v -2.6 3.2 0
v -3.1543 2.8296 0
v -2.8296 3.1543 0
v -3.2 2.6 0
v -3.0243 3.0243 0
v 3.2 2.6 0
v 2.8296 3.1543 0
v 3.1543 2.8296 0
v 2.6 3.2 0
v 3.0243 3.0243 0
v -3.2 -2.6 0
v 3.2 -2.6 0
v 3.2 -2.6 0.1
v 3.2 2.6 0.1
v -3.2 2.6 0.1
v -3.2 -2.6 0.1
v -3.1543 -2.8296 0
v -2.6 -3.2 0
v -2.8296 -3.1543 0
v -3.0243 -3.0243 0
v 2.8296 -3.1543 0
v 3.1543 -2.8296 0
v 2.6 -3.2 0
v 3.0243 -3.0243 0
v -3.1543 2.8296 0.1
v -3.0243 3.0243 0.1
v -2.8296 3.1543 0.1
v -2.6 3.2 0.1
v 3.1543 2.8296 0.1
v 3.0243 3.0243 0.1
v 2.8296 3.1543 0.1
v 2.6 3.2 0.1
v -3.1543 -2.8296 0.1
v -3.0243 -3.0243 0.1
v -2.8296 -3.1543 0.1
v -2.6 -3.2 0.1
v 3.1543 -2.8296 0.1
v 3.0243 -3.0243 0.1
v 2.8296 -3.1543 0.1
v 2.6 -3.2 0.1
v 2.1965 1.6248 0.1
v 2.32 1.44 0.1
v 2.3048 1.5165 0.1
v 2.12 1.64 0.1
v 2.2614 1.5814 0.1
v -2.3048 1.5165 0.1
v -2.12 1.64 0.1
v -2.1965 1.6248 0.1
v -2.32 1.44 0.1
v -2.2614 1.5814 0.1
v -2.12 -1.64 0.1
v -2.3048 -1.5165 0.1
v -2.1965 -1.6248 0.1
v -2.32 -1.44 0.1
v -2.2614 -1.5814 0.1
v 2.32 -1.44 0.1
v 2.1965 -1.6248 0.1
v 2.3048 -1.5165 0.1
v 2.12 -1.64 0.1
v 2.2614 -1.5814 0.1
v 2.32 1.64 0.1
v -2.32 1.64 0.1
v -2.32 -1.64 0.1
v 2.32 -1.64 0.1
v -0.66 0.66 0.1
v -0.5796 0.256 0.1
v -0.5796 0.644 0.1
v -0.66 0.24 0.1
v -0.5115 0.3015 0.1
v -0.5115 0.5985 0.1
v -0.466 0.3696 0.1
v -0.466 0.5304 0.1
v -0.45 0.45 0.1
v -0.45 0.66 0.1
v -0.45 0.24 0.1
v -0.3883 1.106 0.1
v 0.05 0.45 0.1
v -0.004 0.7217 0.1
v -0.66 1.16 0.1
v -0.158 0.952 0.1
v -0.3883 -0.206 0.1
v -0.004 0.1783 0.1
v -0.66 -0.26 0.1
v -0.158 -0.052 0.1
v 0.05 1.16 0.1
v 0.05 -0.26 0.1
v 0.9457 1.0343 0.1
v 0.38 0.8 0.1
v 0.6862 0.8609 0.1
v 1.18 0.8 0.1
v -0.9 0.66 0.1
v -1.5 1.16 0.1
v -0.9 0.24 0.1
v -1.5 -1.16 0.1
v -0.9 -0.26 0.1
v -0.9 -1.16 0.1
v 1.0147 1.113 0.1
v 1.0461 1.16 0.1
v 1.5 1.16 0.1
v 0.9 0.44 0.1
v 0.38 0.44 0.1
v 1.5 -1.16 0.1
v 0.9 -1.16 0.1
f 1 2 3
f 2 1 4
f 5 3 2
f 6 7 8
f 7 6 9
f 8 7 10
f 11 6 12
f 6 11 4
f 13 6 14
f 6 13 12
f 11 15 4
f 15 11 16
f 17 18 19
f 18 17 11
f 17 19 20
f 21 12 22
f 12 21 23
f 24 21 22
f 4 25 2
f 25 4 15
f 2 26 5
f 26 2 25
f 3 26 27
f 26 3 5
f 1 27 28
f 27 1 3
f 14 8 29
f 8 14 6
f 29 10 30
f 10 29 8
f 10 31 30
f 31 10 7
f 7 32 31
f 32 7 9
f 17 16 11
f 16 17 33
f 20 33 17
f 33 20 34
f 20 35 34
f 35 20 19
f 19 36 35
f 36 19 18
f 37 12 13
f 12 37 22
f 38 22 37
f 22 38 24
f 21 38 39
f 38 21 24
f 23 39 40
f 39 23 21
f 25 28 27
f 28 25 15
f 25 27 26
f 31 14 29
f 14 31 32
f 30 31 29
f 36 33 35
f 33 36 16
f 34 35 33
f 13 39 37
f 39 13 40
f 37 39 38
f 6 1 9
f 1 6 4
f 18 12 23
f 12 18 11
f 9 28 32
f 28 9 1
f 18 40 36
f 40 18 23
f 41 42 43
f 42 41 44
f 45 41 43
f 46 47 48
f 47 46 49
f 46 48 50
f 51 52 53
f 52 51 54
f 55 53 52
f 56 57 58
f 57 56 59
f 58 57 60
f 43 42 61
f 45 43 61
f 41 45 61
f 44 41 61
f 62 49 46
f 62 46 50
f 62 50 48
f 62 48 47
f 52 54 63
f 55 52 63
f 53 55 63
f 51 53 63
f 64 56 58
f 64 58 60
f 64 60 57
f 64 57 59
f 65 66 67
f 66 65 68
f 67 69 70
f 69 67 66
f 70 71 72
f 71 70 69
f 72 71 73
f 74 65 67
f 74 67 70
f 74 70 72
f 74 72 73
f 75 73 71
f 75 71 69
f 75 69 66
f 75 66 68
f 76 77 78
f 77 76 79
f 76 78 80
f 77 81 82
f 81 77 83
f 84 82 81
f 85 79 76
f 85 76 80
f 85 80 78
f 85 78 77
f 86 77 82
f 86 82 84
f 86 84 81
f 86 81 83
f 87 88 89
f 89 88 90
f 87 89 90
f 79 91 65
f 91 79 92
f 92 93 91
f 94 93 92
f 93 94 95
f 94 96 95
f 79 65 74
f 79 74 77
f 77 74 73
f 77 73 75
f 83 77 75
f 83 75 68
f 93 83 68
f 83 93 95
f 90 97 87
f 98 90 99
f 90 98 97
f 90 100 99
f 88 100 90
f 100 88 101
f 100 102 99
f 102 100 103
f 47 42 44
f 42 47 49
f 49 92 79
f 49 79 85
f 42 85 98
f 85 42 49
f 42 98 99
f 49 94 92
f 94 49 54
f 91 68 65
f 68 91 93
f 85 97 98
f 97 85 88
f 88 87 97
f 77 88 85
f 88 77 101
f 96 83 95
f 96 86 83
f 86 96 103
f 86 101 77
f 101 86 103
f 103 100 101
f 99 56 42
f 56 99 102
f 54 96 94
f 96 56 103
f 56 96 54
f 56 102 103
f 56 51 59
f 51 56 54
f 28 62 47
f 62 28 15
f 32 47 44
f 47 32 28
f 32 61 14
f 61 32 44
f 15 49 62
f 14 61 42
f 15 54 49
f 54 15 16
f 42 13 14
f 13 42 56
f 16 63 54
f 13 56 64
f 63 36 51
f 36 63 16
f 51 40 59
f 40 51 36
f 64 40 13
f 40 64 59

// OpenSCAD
use <../lib.scad>
use <../p/1-4chrd.scad>
use <../p/1-4cyli.scad>
use <../p/1-4ndis.scad>
use <../p/1-8chrd.scad>
use <../p/1-8ndis.scad>
use <../p/2-4chrd.scad>
use <../p/2-4ndis.scad>
use <../p/box3u12.scad>
$fa=1; $fs=0.2;
function ldraw_lib__6142275s(realsolid=false) = [
// 0 Sticker  0.8 x  0.8 with Red "P1" in White Square on Red Background
// 0 Name: 6142275s.dat
// 0 Author: Massimo Maso [Sirio]
// 0 !LDRAW_ORG Part UPDATE 2022-06
// 0 !LICENSE Licensed under CC BY 2.0 and CC BY 4.0 : see CAreadme.txt
// 
// 0 BFC CERTIFY CCW
  [0,"BFC","CERTIFY"],
  [0,"BFC","CCW"],
// 
// 0 !KEYWORDS Audi, e-tron, quattro, R18, Set 75872, Speed Champions
// 
// 0 !HISTORY 2022-12-20 [PTadmin] Official Update 2022-06
// 
// 
// 0 // Primitives
// 1 16 -6.5 0 6.5 -1.5 0 0 0 -1 0 0 0 1.5 1-4chrd.dat
  [1,16,-6.5,0,6.5,-1.5,0,0,0,-1,0,0,0,1.5, ldraw_lib__1_4chrd(realsolid)],
// 1 16 6.5 0 6.5 1.5 0 0 0 -1 0 0 0 1.5 1-4chrd.dat
  [1,16,6.5,0,6.5,1.5,0,0,0,-1,0,0,0,1.5, ldraw_lib__1_4chrd(realsolid)],
// 1 16 0 -.25 0 0 0 8 0 .25 0 -6.5 0 0 box3u12.dat
  [1,16,0,-.25,0,0,0,8,0,.25,0,-6.5,0,0, ldraw_lib__box3u12(realsolid)],
// 1 16 -6.5 0 -6.5 -1.5 0 0 0 -1 0 0 0 -1.5 1-4chrd.dat
  [1,16,-6.5,0,-6.5,-1.5,0,0,0,-1,0,0,0,-1.5, ldraw_lib__1_4chrd(realsolid)],
// 1 16 6.5 0 -6.5 1.5 0 0 0 -1 0 0 0 -1.5 1-4chrd.dat
  [1,16,6.5,0,-6.5,1.5,0,0,0,-1,0,0,0,-1.5, ldraw_lib__1_4chrd(realsolid)],
// 1 16 -6.5 0 6.5 -1.5 0 0 0 -.25 0 0 0 1.5 1-4cyli.dat
  [1,16,-6.5,0,6.5,-1.5,0,0,0,-.25,0,0,0,1.5, ldraw_lib__1_4cyli(realsolid)],
// 1 16 6.5 0 6.5 1.5 0 0 0 -.25 0 0 0 1.5 1-4cyli.dat
  [1,16,6.5,0,6.5,1.5,0,0,0,-.25,0,0,0,1.5, ldraw_lib__1_4cyli(realsolid)],
// 1 16 -6.5 0 -6.5 -1.5 0 0 0 -.25 0 0 0 -1.5 1-4cyli.dat
  [1,16,-6.5,0,-6.5,-1.5,0,0,0,-.25,0,0,0,-1.5, ldraw_lib__1_4cyli(realsolid)],
// 1 16 6.5 0 -6.5 1.5 0 0 0 -.25 0 0 0 -1.5 1-4cyli.dat
  [1,16,6.5,0,-6.5,1.5,0,0,0,-.25,0,0,0,-1.5, ldraw_lib__1_4cyli(realsolid)],
// 1 4 -6.5 -.25 6.5 -1.5 0 0 0 1 0 0 0 1.5 1-4chrd.dat
  [1,4,-6.5,-.25,6.5,-1.5,0,0,0,1,0,0,0,1.5, ldraw_lib__1_4chrd(realsolid)],
// 1 4 6.5 -.25 6.5 1.5 0 0 0 1 0 0 0 1.5 1-4chrd.dat
  [1,4,6.5,-.25,6.5,1.5,0,0,0,1,0,0,0,1.5, ldraw_lib__1_4chrd(realsolid)],
// 1 4 -6.5 -.25 -6.5 -1.5 0 0 0 1 0 0 0 -1.5 1-4chrd.dat
  [1,4,-6.5,-.25,-6.5,-1.5,0,0,0,1,0,0,0,-1.5, ldraw_lib__1_4chrd(realsolid)],
// 1 4 6.5 -.25 -6.5 1.5 0 0 0 1 0 0 0 -1.5 1-4chrd.dat
  [1,4,6.5,-.25,-6.5,1.5,0,0,0,1,0,0,0,-1.5, ldraw_lib__1_4chrd(realsolid)],
// 0 // Bottom faces
// 4 16 6.5 0 8 8 0 6.5 -8 0 6.5 -6.5 0 8
  [4,16,6.5,0,8,8,0,6.5,-8,0,6.5,-6.5,0,8],
// 4 16 6.5 0 -8 -6.5 0 -8 -8 0 -6.5 8 0 -6.5
  [4,16,6.5,0,-8,-6.5,0,-8,-8,0,-6.5,8,0,-6.5],
// 0 // Lateral faces
// 4 16 -6.5 0 8 -6.5 -.25 8 6.5 -.25 8 6.5 0 8
  [4,16,-6.5,0,8,-6.5,-.25,8,6.5,-.25,8,6.5,0,8],
// 4 16 -6.5 0 -8 6.5 0 -8 6.5 -.25 -8 -6.5 -.25 -8
  [4,16,-6.5,0,-8,6.5,0,-8,6.5,-.25,-8,-6.5,-.25,-8],
// 0 // Top faces
// 0 // Primitives
// 1 15 5.3 -.25 3.6 .5 0 0 0 1 0 0 0 .5 1-4chrd.dat
  [1,15,5.3,-.25,3.6,.5,0,0,0,1,0,0,0,.5, ldraw_lib__1_4chrd(realsolid)],
// 1 15 -5.3 -.25 3.6 -.5 0 0 0 1 0 0 0 .5 1-4chrd.dat
  [1,15,-5.3,-.25,3.6,-.5,0,0,0,1,0,0,0,.5, ldraw_lib__1_4chrd(realsolid)],
// 1 15 -5.3 -.25 -3.6 -.5 0 0 0 1 0 0 0 -.5 1-4chrd.dat
  [1,15,-5.3,-.25,-3.6,-.5,0,0,0,1,0,0,0,-.5, ldraw_lib__1_4chrd(realsolid)],
// 1 15 5.3 -.25 -3.6 .5 0 0 0 1 0 0 0 -.5 1-4chrd.dat
  [1,15,5.3,-.25,-3.6,.5,0,0,0,1,0,0,0,-.5, ldraw_lib__1_4chrd(realsolid)],
// 1 4 5.3 -.25 3.6 .5 0 0 0 1 0 0 0 .5 1-4ndis.dat
  [1,4,5.3,-.25,3.6,.5,0,0,0,1,0,0,0,.5, ldraw_lib__1_4ndis(realsolid)],
// 1 4 -5.3 -.25 3.6 -.5 0 0 0 1 0 0 0 .5 1-4ndis.dat
  [1,4,-5.3,-.25,3.6,-.5,0,0,0,1,0,0,0,.5, ldraw_lib__1_4ndis(realsolid)],
// 1 4 -5.3 -.25 -3.6 -.5 0 0 0 1 0 0 0 -.5 1-4ndis.dat
  [1,4,-5.3,-.25,-3.6,-.5,0,0,0,1,0,0,0,-.5, ldraw_lib__1_4ndis(realsolid)],
// 1 4 5.3 -.25 -3.6 .5 0 0 0 1 0 0 0 -.5 1-4ndis.dat
  [1,4,5.3,-.25,-3.6,.5,0,0,0,1,0,0,0,-.5, ldraw_lib__1_4ndis(realsolid)],
// 1 15 -1.65 -.25 1.125 0 0 .525 0 1 0 .525 0 0 2-4chrd.dat
  [1,15,-1.65,-.25,1.125,0,0,.525,0,1,0,.525,0,0, ldraw_lib__2_4chrd(realsolid)],
// 1 4 -1.65 -.25 1.125 0 0 .525 0 1 0 .525 0 0 2-4ndis.dat
  [1,4,-1.65,-.25,1.125,0,0,.525,0,1,0,.525,0,0, ldraw_lib__2_4ndis(realsolid)],
// 1 4 -1.65 -.25 1.125 0 0 1.775 0 1 0 1.775 0 0 1-4chrd.dat
  [1,4,-1.65,-.25,1.125,0,0,1.775,0,1,0,1.775,0,0, ldraw_lib__1_4chrd(realsolid)],
// 1 4 -1.65 -.25 1.125 0 0 1.775 0 1 0 -1.775 0 0 1-4chrd.dat
  [1,4,-1.65,-.25,1.125,0,0,1.775,0,1,0,-1.775,0,0, ldraw_lib__1_4chrd(realsolid)],
// 1 15 -1.65 -.25 1.125 0 0 1.775 0 1 0 1.775 0 0 2-4ndis.dat
  [1,15,-1.65,-.25,1.125,0,0,1.775,0,1,0,1.775,0,0, ldraw_lib__2_4ndis(realsolid)],
// 1 15 .95 -.25 4 0 0 2 0 1 0 -2 0 0 1-8chrd.dat
  [1,15,.95,-.25,4,0,0,2,0,1,0,-2,0,0, ldraw_lib__1_8chrd(realsolid)],
// 1 4 .95 -.25 4 0 0 2 0 1 0 -2 0 0 1-8ndis.dat
  [1,4,.95,-.25,4,0,0,2,0,1,0,-2,0,0, ldraw_lib__1_8ndis(realsolid)],
// 0 // Red text "P1"
// 0 // Letter "P"
// 4 4 -3.75 -.25 2.9 -2.25 -.25 1.65 -1.65 -.25 1.65 -1.65 -.25 2.9
  [4,4,-3.75,-.25,2.9,-2.25,-.25,1.65,-1.65,-.25,1.65,-1.65,-.25,2.9],
// 3 4 -3.75 -.25 2.9 -2.25 -.25 .6 -2.25 -.25 1.65
  [3,4,-3.75,-.25,2.9,-2.25,-.25,.6,-2.25,-.25,1.65],
// 4 4 -3.75 -.25 2.9 -3.75 -.25 -2.9 -2.25 -.25 -.65 -2.25 -.25 .6
  [4,4,-3.75,-.25,2.9,-3.75,-.25,-2.9,-2.25,-.25,-.65,-2.25,-.25,.6],
// 3 4 -3.75 -.25 -2.9 -2.25 -.25 -2.9 -2.25 -.25 -.65
  [3,4,-3.75,-.25,-2.9,-2.25,-.25,-2.9,-2.25,-.25,-.65],
// 3 4 -1.65 -.25 2.9 -1.65 -.25 1.65 -1.125 -.25 1.65
  [3,4,-1.65,-.25,2.9,-1.65,-.25,1.65,-1.125,-.25,1.65],
// 3 4 -1.65 -.25 2.9 -1.125 -.25 1.65 .125 -.25 1.125
  [3,4,-1.65,-.25,2.9,-1.125,-.25,1.65,.125,-.25,1.125],
// 3 4 .125 -.25 1.125 -1.125 -.25 1.65 -1.125 -.25 1.125
  [3,4,.125,-.25,1.125,-1.125,-.25,1.65,-1.125,-.25,1.125],
// 3 4 .125 -.25 1.125 -1.125 -.25 1.125 -1.125 -.25 .6
  [3,4,.125,-.25,1.125,-1.125,-.25,1.125,-1.125,-.25,.6],
// 3 4 -1.65 -.25 -.65 .125 -.25 1.125 -1.125 -.25 .6
  [3,4,-1.65,-.25,-.65,.125,-.25,1.125,-1.125,-.25,.6],
// 3 4 -1.65 -.25 -.65 -1.125 -.25 .6 -1.65 -.25 .6
  [3,4,-1.65,-.25,-.65,-1.125,-.25,.6,-1.65,-.25,.6],
// 4 4 -1.65 -.25 -.65 -1.65 -.25 .6 -2.25 -.25 .6 -2.25 -.25 -.65
  [4,4,-1.65,-.25,-.65,-1.65,-.25,.6,-2.25,-.25,.6,-2.25,-.25,-.65],
// 0 // Letter "1"
// 3 4 2.95 -.25 2 2.5368 -.25 2.7824 2.3642 -.25 2.5858
  [3,4,2.95,-.25,2,2.5368,-.25,2.7824,2.3642,-.25,2.5858],
// 4 4 3.75 -.25 2.9 2.6153 -.25 2.9 2.5368 -.25 2.7824 2.95 -.25 2
  [4,4,3.75,-.25,2.9,2.6153,-.25,2.9,2.5368,-.25,2.7824,2.95,-.25,2],
// 3 4 2.95 -.25 2 2.25 -.25 1.1 3.75 -.25 2.9
  [3,4,2.95,-.25,2,2.25,-.25,1.1,3.75,-.25,2.9],
// 4 4 2.95 -.25 2 .95 -.25 2 .95 -.25 1.1 2.25 -.25 1.1
  [4,4,2.95,-.25,2,.95,-.25,2,.95,-.25,1.1,2.25,-.25,1.1],
// 4 4 3.75 -.25 2.9 2.25 -.25 1.1 2.25 -.25 -2.9 3.75 -.25 -2.9
  [4,4,3.75,-.25,2.9,2.25,-.25,1.1,2.25,-.25,-2.9,3.75,-.25,-2.9],
// 0 // White square
// 4 15 -5.3 -.25 4.1 -5.8 -.25 3.6 5.8 -.25 3.6 5.3 -.25 4.1
  [4,15,-5.3,-.25,4.1,-5.8,-.25,3.6,5.8,-.25,3.6,5.3,-.25,4.1],
// 3 15 -5.8 -.25 3.6 -3.75 -.25 2.9 -1.65 -.25 2.9
  [3,15,-5.8,-.25,3.6,-3.75,-.25,2.9,-1.65,-.25,2.9],
// 3 15 -5.8 -.25 3.6 -1.65 -.25 2.9 .125 -.25 2.9
  [3,15,-5.8,-.25,3.6,-1.65,-.25,2.9,.125,-.25,2.9],
// 4 15 -5.8 -.25 3.6 .125 -.25 2.9 2.6153 -.25 2.9 5.8 -.25 3.6
  [4,15,-5.8,-.25,3.6,.125,-.25,2.9,2.6153,-.25,2.9,5.8,-.25,3.6],
// 3 15 5.8 -.25 3.6 2.6153 -.25 2.9 3.75 -.25 2.9
  [3,15,5.8,-.25,3.6,2.6153,-.25,2.9,3.75,-.25,2.9],
// 4 15 -5.8 -.25 3.6 -5.8 -.25 -3.6 -3.75 -.25 -2.9 -3.75 -.25 2.9
  [4,15,-5.8,-.25,3.6,-5.8,-.25,-3.6,-3.75,-.25,-2.9,-3.75,-.25,2.9],
// 4 15 -1.65 -.25 1.65 -2.25 -.25 1.65 -2.25 -.25 .6 -1.65 -.25 .6
  [4,15,-1.65,-.25,1.65,-2.25,-.25,1.65,-2.25,-.25,.6,-1.65,-.25,.6],
// 4 15 .95 -.25 2 2.5368 -.25 2.7824 2.6153 -.25 2.9 .125 -.25 2.9
  [4,15,.95,-.25,2,2.5368,-.25,2.7824,2.6153,-.25,2.9,.125,-.25,2.9],
// 3 15 .95 -.25 2 2.3642 -.25 2.5858 2.5368 -.25 2.7824
  [3,15,.95,-.25,2,2.3642,-.25,2.5858,2.5368,-.25,2.7824],
// 4 15 .95 -.25 2 .125 -.25 2.9 .125 -.25 1.125 .95 -.25 1.1
  [4,15,.95,-.25,2,.125,-.25,2.9,.125,-.25,1.125,.95,-.25,1.1],
// 3 15 -2.25 -.25 -2.9 -1.65 -.25 -.65 -2.25 -.25 -.65
  [3,15,-2.25,-.25,-2.9,-1.65,-.25,-.65,-2.25,-.25,-.65],
// 4 15 -2.25 -.25 -2.9 2.25 -.25 -2.9 .125 -.25 -.65 -1.65 -.25 -.65
  [4,15,-2.25,-.25,-2.9,2.25,-.25,-2.9,.125,-.25,-.65,-1.65,-.25,-.65],
// 4 15 2.25 -.25 -2.9 .95 -.25 1.1 .125 -.25 1.125 .125 -.25 -.65
  [4,15,2.25,-.25,-2.9,.95,-.25,1.1,.125,-.25,1.125,.125,-.25,-.65],
// 3 15 2.25 -.25 -2.9 2.25 -.25 1.1 .95 -.25 1.1
  [3,15,2.25,-.25,-2.9,2.25,-.25,1.1,.95,-.25,1.1],
// 4 15 5.8 -.25 3.6 3.75 -.25 2.9 3.75 -.25 -2.9 5.8 -.25 -3.6
  [4,15,5.8,-.25,3.6,3.75,-.25,2.9,3.75,-.25,-2.9,5.8,-.25,-3.6],
// 3 15 -5.8 -.25 -3.6 -2.25 -.25 -2.9 -3.75 -.25 -2.9
  [3,15,-5.8,-.25,-3.6,-2.25,-.25,-2.9,-3.75,-.25,-2.9],
// 4 15 -5.8 -.25 -3.6 5.8 -.25 -3.6 2.25 -.25 -2.9 -2.25 -.25 -2.9
  [4,15,-5.8,-.25,-3.6,5.8,-.25,-3.6,2.25,-.25,-2.9,-2.25,-.25,-2.9],
// 3 15 5.8 -.25 -3.6 3.75 -.25 -2.9 2.25 -.25 -2.9
  [3,15,5.8,-.25,-3.6,3.75,-.25,-2.9,2.25,-.25,-2.9],
// 4 15 -5.8 -.25 -3.6 -5.3 -.25 -4.1 5.3 -.25 -4.1 5.8 -.25 -3.6
  [4,15,-5.8,-.25,-3.6,-5.3,-.25,-4.1,5.3,-.25,-4.1,5.8,-.25,-3.6],
// 0 // Red background
// 4 4 -6.5 -.25 8 -8 -.25 6.5 -5.8 -.25 4.1 -5.3 -.25 4.1
  [4,4,-6.5,-.25,8,-8,-.25,6.5,-5.8,-.25,4.1,-5.3,-.25,4.1],
// 4 4 -6.5 -.25 8 -5.3 -.25 4.1 5.3 -.25 4.1 6.5 -.25 8
  [4,4,-6.5,-.25,8,-5.3,-.25,4.1,5.3,-.25,4.1,6.5,-.25,8],
// 4 4 6.5 -.25 8 5.3 -.25 4.1 5.8 -.25 4.1 8 -.25 6.5
  [4,4,6.5,-.25,8,5.3,-.25,4.1,5.8,-.25,4.1,8,-.25,6.5],
// 3 4 -8 -.25 6.5 -5.8 -.25 3.6 -5.8 -.25 4.1
  [3,4,-8,-.25,6.5,-5.8,-.25,3.6,-5.8,-.25,4.1],
// 3 4 8 -.25 6.5 5.8 -.25 4.1 5.8 -.25 3.6
  [3,4,8,-.25,6.5,5.8,-.25,4.1,5.8,-.25,3.6],
// 4 4 -8 -.25 6.5 -8 -.25 -6.5 -5.8 -.25 -3.6 -5.8 -.25 3.6
  [4,4,-8,-.25,6.5,-8,-.25,-6.5,-5.8,-.25,-3.6,-5.8,-.25,3.6],
// 4 4 8 -.25 6.5 5.8 -.25 3.6 5.8 -.25 -3.6 8 -.25 -6.5
  [4,4,8,-.25,6.5,5.8,-.25,3.6,5.8,-.25,-3.6,8,-.25,-6.5],
// 3 4 -8 -.25 -6.5 -5.8 -.25 -4.1 -5.8 -.25 -3.6
  [3,4,-8,-.25,-6.5,-5.8,-.25,-4.1,-5.8,-.25,-3.6],
// 3 4 8 -.25 -6.5 5.8 -.25 -3.6 5.8 -.25 -4.1
  [3,4,8,-.25,-6.5,5.8,-.25,-3.6,5.8,-.25,-4.1],
// 4 4 -6.5 -.25 -8 -5.3 -.25 -4.1 -5.8 -.25 -4.1 -8 -.25 -6.5
  [4,4,-6.5,-.25,-8,-5.3,-.25,-4.1,-5.8,-.25,-4.1,-8,-.25,-6.5],
// 4 4 -6.5 -.25 -8 6.5 -.25 -8 5.3 -.25 -4.1 -5.3 -.25 -4.1
  [4,4,-6.5,-.25,-8,6.5,-.25,-8,5.3,-.25,-4.1,-5.3,-.25,-4.1],
// 4 4 6.5 -.25 -8 8 -.25 -6.5 5.8 -.25 -4.1 5.3 -.25 -4.1
  [4,4,6.5,-.25,-8,8,-.25,-6.5,5.8,-.25,-4.1,5.3,-.25,-4.1],
];
module ldraw_lib__6142275s(step=0, col=false, unit=2/5, alt=false, line=0.2, solid=!$preview)
    makepoly(ldraw_lib__6142275s(solid), step=step, col=col, unit=unit, alt=alt, line=line, solid=solid);
ldraw_lib__6142275s(line=0.2);
